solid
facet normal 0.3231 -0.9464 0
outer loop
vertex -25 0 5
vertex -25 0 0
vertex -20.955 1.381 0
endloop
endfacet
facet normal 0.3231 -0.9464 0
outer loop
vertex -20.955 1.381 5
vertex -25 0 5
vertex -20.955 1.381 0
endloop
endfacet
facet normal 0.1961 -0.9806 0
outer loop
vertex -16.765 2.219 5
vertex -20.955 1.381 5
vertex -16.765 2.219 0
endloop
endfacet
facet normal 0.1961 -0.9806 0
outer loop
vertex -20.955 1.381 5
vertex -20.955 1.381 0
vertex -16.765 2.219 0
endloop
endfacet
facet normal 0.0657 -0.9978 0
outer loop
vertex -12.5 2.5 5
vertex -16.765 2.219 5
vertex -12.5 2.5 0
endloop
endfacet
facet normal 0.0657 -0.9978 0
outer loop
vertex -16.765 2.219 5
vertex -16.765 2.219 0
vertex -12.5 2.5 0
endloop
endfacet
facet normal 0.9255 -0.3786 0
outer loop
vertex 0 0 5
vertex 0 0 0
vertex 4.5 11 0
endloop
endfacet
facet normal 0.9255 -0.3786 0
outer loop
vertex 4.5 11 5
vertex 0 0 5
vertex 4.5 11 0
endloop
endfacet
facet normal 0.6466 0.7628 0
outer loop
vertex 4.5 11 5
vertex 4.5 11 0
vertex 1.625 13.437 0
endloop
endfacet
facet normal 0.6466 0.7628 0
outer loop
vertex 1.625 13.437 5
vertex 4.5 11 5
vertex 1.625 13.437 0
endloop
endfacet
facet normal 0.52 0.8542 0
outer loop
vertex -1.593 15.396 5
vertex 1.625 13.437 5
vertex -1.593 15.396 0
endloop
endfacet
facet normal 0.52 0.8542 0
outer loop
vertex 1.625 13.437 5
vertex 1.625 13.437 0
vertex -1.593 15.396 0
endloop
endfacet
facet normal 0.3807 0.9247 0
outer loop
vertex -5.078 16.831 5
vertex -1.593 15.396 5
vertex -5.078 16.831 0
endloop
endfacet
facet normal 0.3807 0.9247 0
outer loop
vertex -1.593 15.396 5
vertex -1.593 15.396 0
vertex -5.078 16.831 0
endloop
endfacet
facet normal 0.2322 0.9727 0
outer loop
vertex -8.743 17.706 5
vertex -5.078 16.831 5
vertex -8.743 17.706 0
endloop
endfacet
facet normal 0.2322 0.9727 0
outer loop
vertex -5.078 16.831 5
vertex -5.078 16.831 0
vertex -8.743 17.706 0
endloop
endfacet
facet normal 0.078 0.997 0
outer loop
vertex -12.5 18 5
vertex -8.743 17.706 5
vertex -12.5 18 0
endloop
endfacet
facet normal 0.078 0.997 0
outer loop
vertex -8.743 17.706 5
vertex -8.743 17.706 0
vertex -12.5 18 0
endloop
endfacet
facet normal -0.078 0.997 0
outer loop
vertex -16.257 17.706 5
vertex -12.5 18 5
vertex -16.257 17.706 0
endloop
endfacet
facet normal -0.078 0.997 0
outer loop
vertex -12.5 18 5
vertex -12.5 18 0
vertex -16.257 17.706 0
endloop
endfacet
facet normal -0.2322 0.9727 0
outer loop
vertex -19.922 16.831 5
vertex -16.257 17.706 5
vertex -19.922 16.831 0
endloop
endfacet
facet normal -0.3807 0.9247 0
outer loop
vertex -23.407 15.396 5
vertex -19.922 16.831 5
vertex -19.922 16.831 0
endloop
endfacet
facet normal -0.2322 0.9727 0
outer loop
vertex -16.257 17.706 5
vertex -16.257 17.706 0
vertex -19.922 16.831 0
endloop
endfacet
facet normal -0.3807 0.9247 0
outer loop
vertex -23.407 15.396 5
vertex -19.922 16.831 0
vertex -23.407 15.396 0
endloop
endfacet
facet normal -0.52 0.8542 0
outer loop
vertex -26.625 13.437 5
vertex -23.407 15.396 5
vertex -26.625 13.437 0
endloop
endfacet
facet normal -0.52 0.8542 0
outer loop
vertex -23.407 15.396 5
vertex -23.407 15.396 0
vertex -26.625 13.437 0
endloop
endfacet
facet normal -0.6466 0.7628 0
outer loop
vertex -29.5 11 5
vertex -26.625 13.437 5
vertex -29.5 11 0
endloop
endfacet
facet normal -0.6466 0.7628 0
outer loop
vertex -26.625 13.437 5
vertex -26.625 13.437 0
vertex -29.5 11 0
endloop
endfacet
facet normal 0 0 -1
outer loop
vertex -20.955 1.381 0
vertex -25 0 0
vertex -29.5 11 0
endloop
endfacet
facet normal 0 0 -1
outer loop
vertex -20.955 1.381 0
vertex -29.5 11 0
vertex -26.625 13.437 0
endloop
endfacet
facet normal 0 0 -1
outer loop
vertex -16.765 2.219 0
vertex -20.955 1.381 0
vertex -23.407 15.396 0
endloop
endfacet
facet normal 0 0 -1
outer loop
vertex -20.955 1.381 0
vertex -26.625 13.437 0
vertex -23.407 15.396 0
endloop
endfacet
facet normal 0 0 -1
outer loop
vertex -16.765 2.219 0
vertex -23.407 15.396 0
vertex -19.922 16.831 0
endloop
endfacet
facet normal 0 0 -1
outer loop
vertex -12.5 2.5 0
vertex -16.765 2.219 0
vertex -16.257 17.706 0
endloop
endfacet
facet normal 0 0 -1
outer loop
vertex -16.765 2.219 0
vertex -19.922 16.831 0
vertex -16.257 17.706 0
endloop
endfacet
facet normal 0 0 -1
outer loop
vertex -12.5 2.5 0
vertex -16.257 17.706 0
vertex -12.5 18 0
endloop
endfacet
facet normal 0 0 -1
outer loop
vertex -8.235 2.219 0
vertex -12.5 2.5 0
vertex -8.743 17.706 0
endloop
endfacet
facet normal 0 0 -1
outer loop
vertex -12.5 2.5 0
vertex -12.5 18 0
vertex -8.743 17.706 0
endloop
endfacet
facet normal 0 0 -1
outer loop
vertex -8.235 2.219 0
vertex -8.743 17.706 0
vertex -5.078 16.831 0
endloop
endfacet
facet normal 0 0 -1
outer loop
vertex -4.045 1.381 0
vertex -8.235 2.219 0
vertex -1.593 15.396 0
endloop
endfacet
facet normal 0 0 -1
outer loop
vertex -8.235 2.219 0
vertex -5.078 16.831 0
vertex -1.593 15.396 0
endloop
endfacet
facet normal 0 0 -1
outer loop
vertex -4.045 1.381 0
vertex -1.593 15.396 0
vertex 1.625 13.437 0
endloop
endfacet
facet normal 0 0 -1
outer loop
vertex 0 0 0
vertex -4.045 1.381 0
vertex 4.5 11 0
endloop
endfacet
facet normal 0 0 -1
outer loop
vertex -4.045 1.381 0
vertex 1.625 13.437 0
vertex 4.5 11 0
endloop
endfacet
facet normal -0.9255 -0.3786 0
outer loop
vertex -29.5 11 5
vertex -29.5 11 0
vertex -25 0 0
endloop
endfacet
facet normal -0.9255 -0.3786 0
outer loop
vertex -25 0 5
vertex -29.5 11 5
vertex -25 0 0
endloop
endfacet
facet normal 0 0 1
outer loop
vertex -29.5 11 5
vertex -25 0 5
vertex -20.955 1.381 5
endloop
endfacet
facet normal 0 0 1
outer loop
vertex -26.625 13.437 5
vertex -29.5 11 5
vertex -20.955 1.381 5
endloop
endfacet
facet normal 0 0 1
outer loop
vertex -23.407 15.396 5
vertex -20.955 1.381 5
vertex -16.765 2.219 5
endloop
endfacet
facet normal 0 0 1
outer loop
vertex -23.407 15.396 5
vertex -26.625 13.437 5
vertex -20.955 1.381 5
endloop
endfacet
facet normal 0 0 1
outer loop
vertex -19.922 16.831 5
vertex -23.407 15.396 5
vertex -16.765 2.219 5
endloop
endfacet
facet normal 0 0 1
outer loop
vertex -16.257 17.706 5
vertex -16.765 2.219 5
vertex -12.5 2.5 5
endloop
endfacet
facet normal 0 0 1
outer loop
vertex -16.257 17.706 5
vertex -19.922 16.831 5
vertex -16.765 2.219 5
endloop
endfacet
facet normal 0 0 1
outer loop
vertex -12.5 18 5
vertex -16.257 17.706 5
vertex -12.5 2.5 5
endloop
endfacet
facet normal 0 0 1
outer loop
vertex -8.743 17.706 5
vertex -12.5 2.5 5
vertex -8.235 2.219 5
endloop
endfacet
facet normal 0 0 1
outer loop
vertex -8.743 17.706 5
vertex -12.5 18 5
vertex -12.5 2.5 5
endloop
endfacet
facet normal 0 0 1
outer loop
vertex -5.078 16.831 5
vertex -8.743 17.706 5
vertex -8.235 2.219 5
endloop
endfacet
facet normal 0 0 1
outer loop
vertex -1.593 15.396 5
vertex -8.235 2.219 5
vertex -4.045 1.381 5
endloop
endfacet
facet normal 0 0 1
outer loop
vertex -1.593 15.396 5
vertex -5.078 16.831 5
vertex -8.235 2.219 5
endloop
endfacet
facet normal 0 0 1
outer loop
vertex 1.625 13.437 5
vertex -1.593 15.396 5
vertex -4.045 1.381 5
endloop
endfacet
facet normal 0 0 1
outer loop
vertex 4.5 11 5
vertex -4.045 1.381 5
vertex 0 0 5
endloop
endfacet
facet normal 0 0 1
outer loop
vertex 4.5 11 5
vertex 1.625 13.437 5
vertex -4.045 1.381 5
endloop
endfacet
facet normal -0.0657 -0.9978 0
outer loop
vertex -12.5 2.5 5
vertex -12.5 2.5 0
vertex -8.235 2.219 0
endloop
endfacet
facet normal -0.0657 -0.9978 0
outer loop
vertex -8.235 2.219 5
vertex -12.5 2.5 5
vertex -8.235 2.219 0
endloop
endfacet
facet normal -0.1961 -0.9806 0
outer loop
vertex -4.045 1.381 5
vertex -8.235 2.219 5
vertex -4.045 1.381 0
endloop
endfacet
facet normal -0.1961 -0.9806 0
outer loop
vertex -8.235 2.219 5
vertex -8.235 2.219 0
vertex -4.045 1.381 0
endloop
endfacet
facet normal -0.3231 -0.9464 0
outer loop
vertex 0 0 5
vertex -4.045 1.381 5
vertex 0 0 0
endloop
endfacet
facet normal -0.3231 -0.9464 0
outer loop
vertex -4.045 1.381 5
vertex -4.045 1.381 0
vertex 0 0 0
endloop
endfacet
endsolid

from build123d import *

# Parameters (mm, degrees)
F1_DEPTH = 5


with BuildPart() as f1:
    # F0 (on Top) → F1 (new body)
    with BuildSketch(Plane.XY):
        with BuildLine():
            ThreePointArc((-25, 0), (-18.873774, 1.868872), (-12.5, 2.5))
            Line((-12.5, 2.5), (-12.5, 11))
            Line((-12.5, 11), (-29.5, 11))
            Line((-29.5, 11), (-25, 0))
        make_face()
        with BuildLine():
            ThreePointArc((-12.5, 2.5), (-6.126226, 1.868872), (0, 0))
            Line((0, 0), (4.5, 11))
            ThreePointArc((4.5, 11), (-12.5, 18), (-29.5, 11))
            Line((-29.5, 11), (-12.5, 11))
            Line((-12.5, 11), (-12.5, 2.5))
        make_face()
    extrude(amount=F1_DEPTH)


solid = f1.part
